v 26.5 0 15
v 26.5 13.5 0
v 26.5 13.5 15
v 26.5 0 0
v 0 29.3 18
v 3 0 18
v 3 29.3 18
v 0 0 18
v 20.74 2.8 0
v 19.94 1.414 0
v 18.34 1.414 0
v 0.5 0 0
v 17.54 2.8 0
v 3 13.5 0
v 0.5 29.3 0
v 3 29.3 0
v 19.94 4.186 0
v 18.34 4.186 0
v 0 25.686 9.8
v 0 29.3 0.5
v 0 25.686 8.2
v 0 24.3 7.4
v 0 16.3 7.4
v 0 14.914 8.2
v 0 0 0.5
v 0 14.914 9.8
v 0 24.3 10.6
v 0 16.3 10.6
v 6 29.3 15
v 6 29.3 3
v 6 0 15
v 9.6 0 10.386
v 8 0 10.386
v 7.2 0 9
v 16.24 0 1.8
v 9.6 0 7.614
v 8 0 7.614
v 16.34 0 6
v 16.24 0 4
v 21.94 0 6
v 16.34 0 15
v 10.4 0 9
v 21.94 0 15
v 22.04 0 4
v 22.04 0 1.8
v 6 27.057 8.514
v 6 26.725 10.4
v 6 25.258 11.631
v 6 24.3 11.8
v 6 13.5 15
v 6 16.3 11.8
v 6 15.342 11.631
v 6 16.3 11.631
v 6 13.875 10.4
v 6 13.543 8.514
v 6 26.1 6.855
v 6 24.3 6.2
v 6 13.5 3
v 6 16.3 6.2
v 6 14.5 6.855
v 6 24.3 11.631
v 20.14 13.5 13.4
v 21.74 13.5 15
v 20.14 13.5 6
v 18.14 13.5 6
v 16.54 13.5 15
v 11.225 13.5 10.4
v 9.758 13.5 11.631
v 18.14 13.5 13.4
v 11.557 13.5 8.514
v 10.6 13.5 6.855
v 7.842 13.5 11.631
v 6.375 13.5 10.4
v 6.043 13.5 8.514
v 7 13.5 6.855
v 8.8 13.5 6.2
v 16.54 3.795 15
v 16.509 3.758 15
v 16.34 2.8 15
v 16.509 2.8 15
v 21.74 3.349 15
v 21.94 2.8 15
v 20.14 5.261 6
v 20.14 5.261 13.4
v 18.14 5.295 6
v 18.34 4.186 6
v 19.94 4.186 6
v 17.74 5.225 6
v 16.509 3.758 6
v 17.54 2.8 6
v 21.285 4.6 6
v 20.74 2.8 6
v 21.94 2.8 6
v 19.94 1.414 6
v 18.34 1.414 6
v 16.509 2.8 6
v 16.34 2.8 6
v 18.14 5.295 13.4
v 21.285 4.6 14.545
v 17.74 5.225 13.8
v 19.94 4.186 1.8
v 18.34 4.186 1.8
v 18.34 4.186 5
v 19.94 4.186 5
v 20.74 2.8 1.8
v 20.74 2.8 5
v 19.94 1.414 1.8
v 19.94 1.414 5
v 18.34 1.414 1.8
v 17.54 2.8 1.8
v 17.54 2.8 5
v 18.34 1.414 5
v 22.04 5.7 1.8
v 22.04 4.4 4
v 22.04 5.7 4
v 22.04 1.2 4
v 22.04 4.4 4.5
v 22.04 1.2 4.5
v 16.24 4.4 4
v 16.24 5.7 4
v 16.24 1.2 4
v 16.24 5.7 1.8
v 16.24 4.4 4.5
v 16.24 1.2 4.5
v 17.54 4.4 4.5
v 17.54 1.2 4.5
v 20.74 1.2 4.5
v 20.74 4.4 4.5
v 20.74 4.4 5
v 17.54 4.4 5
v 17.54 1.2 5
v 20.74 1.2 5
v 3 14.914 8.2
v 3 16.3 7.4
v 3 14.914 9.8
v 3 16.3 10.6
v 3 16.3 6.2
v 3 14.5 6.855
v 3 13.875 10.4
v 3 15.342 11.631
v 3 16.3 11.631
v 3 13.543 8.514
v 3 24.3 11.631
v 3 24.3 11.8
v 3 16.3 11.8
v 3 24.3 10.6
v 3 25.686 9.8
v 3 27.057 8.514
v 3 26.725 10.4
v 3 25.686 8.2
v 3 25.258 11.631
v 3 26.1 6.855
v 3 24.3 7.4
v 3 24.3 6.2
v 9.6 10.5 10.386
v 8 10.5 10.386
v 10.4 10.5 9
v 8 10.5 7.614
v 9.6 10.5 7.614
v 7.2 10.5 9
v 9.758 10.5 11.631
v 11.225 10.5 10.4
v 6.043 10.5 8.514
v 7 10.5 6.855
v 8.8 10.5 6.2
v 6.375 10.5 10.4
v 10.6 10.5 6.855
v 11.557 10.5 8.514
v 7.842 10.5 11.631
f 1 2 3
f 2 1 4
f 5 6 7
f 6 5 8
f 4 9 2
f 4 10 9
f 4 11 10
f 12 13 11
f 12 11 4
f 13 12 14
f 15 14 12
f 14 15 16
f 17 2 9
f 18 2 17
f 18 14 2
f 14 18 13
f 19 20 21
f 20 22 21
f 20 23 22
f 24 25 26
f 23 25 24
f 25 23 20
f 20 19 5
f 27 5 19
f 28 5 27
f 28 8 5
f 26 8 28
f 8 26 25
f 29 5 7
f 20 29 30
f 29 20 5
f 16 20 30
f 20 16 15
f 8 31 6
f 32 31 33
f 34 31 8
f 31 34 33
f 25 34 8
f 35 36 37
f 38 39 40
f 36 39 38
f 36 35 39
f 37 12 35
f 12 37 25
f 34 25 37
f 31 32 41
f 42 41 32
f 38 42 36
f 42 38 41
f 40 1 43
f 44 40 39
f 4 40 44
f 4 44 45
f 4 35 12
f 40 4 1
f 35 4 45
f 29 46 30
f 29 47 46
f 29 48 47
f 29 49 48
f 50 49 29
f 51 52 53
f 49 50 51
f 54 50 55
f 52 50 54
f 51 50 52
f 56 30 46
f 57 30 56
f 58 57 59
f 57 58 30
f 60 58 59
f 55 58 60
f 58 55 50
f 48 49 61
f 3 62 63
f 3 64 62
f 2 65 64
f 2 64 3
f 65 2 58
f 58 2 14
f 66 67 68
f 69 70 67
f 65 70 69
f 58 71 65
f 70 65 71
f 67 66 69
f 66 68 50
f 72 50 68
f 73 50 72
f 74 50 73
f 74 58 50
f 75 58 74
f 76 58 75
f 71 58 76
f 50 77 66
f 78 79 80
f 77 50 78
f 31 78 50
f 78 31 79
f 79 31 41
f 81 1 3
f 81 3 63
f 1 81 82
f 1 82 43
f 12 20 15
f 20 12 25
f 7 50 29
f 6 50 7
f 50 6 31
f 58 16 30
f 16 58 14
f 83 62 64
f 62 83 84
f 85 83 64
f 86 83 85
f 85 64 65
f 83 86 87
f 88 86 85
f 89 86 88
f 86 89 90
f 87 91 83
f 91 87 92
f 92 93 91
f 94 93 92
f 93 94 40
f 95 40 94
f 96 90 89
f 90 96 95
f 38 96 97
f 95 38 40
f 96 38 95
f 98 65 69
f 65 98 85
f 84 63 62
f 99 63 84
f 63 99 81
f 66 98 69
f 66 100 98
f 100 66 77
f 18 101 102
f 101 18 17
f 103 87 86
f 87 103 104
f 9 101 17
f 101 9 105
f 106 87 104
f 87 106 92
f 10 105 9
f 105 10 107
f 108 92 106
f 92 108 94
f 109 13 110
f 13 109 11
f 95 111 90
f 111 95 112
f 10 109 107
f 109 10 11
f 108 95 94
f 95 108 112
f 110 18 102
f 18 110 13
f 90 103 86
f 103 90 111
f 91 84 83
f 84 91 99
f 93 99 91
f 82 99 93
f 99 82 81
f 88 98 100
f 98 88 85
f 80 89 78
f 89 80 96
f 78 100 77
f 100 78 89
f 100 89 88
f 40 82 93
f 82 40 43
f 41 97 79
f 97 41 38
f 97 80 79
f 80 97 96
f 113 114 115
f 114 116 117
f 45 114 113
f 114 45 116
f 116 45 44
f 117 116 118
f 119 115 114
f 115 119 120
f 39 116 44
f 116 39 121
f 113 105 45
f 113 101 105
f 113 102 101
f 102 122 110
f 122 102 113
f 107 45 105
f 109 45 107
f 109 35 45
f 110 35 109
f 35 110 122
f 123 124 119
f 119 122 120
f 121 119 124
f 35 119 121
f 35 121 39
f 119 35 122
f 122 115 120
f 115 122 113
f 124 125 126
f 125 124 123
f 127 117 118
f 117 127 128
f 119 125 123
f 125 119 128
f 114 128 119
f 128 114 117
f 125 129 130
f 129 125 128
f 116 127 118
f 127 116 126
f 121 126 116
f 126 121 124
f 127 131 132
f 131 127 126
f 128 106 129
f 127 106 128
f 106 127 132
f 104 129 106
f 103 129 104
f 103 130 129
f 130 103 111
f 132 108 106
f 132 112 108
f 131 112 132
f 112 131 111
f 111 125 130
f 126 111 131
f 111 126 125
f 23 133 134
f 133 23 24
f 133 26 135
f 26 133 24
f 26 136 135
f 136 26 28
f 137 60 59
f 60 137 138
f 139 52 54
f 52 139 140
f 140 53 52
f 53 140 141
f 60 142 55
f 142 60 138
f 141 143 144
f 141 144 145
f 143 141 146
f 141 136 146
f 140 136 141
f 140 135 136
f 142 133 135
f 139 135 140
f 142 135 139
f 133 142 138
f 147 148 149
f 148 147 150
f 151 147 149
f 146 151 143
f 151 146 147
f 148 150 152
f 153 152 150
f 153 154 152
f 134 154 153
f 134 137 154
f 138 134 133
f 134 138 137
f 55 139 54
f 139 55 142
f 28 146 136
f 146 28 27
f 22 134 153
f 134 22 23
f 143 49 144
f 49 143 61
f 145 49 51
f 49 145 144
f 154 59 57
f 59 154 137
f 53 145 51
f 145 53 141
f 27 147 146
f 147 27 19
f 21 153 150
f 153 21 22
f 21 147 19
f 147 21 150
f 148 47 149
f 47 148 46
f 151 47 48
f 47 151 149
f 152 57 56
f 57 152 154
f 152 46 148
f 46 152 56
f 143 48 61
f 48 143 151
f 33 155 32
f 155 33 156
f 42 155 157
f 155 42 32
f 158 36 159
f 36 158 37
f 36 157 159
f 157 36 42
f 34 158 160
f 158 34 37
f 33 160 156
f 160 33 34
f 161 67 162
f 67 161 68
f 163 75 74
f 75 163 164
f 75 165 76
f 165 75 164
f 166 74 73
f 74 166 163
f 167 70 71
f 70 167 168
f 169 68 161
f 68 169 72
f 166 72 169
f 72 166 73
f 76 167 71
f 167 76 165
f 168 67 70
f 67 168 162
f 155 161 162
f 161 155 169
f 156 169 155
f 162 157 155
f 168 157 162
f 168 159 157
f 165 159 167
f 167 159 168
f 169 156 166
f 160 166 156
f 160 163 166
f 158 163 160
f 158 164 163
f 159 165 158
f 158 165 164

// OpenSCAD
// PIRANHA iteration1
// y belt tensioner
// GNU GPL v3
// Usan Siriwardana <usiriwar@uwaterloo.ca> and contributors
// based on Prusa i3 MK3S
// https://reprap.org/wiki/Prusa_i3_MK3

difference(){
	cube([26.5, 29.3, 18]);

	// trim
	translate([6, 13.5, -0.5])cube([30, 30, 18+1]);
	translate([6, -0.5, 18-3])cube([30, 30, 4]);
	translate([0, -0.5, 0.5])rotate([0, 90+45, 0])cube([1, 30, 1]);
	translate([6, -0.5, 18-3])rotate([0, -45, 0])cube([10, 30, 10]);
	translate([3, 13.5, 0])rotate([0, 45, 0])cube([10, 30, 10]);
	
	// belt cutout
	translate([18.14, -0.5, 6])cube([2, 30, 30]);
	translate([18.14 + 2/2, -0.5, 18 - 2.8*2])rotate([0, -45, 0])cube([30, 30, 30]);
	translate([19.14, 2.8, -0.5])cylinder(h = 30, r = 1.6);
	translate([19.14, 2.8, 6])cylinder(h = 30, r = 2.8);
	translate([19.14-2.8, 2.8 - 5, 6])cube([2.8*2, 5, 30]);
	
	// square nut
	translate([19.14, 2.8, 4-2.2/2])cube([5.8, 5.8, 2.2], center=true);
	translate([19.14, 2.8, 4-2.2/2 + 0.5])cube([5.8, 1.6*2, 2.2], center=true);
	translate([19.14, 2.8, 4-2.2/2 + 0.5*2])cube([1.6*2, 1.6*2, 2.2], center=true);

	// mounting
	translate([-0.5, 13.5+2.8, 9])rotate([0, 90, 0])cylinder(h = 30, r = 1.6);
	translate([3, 13.5+2.8, 9])rotate([0, 90, 0])cylinder(h = 30, r = 2.8);
	translate([-0.5, 13.5+2.8, 9-1.6])cube([30, 8, 1.6*2]);
	translate([3, 13.5+2.8, 9-2.8])cube([30, 8, 2.8*2]);	
	translate([-0.5, 13.5+2.8 + 8, 9])rotate([0, 90, 0])cylinder(h = 30, r = 1.6);
	translate([3, 13.5+2.8 + 8, 9])rotate([0, 90, 0])cylinder(h = 30, r = 2.8);
	
	
	
	translate([8.8, -0.5, 9])rotate([-90, 0, 0])cylinder(h = 30, r = 1.6);
	translate([8.8, 10.5, 9])rotate([-90, 90, 0])cylinder(h = 4+1, r = 2.8);
	
	// revision
	translate([0, 15, 5])rotate([90, 0, 180+90])text("R1", size=8);
}
